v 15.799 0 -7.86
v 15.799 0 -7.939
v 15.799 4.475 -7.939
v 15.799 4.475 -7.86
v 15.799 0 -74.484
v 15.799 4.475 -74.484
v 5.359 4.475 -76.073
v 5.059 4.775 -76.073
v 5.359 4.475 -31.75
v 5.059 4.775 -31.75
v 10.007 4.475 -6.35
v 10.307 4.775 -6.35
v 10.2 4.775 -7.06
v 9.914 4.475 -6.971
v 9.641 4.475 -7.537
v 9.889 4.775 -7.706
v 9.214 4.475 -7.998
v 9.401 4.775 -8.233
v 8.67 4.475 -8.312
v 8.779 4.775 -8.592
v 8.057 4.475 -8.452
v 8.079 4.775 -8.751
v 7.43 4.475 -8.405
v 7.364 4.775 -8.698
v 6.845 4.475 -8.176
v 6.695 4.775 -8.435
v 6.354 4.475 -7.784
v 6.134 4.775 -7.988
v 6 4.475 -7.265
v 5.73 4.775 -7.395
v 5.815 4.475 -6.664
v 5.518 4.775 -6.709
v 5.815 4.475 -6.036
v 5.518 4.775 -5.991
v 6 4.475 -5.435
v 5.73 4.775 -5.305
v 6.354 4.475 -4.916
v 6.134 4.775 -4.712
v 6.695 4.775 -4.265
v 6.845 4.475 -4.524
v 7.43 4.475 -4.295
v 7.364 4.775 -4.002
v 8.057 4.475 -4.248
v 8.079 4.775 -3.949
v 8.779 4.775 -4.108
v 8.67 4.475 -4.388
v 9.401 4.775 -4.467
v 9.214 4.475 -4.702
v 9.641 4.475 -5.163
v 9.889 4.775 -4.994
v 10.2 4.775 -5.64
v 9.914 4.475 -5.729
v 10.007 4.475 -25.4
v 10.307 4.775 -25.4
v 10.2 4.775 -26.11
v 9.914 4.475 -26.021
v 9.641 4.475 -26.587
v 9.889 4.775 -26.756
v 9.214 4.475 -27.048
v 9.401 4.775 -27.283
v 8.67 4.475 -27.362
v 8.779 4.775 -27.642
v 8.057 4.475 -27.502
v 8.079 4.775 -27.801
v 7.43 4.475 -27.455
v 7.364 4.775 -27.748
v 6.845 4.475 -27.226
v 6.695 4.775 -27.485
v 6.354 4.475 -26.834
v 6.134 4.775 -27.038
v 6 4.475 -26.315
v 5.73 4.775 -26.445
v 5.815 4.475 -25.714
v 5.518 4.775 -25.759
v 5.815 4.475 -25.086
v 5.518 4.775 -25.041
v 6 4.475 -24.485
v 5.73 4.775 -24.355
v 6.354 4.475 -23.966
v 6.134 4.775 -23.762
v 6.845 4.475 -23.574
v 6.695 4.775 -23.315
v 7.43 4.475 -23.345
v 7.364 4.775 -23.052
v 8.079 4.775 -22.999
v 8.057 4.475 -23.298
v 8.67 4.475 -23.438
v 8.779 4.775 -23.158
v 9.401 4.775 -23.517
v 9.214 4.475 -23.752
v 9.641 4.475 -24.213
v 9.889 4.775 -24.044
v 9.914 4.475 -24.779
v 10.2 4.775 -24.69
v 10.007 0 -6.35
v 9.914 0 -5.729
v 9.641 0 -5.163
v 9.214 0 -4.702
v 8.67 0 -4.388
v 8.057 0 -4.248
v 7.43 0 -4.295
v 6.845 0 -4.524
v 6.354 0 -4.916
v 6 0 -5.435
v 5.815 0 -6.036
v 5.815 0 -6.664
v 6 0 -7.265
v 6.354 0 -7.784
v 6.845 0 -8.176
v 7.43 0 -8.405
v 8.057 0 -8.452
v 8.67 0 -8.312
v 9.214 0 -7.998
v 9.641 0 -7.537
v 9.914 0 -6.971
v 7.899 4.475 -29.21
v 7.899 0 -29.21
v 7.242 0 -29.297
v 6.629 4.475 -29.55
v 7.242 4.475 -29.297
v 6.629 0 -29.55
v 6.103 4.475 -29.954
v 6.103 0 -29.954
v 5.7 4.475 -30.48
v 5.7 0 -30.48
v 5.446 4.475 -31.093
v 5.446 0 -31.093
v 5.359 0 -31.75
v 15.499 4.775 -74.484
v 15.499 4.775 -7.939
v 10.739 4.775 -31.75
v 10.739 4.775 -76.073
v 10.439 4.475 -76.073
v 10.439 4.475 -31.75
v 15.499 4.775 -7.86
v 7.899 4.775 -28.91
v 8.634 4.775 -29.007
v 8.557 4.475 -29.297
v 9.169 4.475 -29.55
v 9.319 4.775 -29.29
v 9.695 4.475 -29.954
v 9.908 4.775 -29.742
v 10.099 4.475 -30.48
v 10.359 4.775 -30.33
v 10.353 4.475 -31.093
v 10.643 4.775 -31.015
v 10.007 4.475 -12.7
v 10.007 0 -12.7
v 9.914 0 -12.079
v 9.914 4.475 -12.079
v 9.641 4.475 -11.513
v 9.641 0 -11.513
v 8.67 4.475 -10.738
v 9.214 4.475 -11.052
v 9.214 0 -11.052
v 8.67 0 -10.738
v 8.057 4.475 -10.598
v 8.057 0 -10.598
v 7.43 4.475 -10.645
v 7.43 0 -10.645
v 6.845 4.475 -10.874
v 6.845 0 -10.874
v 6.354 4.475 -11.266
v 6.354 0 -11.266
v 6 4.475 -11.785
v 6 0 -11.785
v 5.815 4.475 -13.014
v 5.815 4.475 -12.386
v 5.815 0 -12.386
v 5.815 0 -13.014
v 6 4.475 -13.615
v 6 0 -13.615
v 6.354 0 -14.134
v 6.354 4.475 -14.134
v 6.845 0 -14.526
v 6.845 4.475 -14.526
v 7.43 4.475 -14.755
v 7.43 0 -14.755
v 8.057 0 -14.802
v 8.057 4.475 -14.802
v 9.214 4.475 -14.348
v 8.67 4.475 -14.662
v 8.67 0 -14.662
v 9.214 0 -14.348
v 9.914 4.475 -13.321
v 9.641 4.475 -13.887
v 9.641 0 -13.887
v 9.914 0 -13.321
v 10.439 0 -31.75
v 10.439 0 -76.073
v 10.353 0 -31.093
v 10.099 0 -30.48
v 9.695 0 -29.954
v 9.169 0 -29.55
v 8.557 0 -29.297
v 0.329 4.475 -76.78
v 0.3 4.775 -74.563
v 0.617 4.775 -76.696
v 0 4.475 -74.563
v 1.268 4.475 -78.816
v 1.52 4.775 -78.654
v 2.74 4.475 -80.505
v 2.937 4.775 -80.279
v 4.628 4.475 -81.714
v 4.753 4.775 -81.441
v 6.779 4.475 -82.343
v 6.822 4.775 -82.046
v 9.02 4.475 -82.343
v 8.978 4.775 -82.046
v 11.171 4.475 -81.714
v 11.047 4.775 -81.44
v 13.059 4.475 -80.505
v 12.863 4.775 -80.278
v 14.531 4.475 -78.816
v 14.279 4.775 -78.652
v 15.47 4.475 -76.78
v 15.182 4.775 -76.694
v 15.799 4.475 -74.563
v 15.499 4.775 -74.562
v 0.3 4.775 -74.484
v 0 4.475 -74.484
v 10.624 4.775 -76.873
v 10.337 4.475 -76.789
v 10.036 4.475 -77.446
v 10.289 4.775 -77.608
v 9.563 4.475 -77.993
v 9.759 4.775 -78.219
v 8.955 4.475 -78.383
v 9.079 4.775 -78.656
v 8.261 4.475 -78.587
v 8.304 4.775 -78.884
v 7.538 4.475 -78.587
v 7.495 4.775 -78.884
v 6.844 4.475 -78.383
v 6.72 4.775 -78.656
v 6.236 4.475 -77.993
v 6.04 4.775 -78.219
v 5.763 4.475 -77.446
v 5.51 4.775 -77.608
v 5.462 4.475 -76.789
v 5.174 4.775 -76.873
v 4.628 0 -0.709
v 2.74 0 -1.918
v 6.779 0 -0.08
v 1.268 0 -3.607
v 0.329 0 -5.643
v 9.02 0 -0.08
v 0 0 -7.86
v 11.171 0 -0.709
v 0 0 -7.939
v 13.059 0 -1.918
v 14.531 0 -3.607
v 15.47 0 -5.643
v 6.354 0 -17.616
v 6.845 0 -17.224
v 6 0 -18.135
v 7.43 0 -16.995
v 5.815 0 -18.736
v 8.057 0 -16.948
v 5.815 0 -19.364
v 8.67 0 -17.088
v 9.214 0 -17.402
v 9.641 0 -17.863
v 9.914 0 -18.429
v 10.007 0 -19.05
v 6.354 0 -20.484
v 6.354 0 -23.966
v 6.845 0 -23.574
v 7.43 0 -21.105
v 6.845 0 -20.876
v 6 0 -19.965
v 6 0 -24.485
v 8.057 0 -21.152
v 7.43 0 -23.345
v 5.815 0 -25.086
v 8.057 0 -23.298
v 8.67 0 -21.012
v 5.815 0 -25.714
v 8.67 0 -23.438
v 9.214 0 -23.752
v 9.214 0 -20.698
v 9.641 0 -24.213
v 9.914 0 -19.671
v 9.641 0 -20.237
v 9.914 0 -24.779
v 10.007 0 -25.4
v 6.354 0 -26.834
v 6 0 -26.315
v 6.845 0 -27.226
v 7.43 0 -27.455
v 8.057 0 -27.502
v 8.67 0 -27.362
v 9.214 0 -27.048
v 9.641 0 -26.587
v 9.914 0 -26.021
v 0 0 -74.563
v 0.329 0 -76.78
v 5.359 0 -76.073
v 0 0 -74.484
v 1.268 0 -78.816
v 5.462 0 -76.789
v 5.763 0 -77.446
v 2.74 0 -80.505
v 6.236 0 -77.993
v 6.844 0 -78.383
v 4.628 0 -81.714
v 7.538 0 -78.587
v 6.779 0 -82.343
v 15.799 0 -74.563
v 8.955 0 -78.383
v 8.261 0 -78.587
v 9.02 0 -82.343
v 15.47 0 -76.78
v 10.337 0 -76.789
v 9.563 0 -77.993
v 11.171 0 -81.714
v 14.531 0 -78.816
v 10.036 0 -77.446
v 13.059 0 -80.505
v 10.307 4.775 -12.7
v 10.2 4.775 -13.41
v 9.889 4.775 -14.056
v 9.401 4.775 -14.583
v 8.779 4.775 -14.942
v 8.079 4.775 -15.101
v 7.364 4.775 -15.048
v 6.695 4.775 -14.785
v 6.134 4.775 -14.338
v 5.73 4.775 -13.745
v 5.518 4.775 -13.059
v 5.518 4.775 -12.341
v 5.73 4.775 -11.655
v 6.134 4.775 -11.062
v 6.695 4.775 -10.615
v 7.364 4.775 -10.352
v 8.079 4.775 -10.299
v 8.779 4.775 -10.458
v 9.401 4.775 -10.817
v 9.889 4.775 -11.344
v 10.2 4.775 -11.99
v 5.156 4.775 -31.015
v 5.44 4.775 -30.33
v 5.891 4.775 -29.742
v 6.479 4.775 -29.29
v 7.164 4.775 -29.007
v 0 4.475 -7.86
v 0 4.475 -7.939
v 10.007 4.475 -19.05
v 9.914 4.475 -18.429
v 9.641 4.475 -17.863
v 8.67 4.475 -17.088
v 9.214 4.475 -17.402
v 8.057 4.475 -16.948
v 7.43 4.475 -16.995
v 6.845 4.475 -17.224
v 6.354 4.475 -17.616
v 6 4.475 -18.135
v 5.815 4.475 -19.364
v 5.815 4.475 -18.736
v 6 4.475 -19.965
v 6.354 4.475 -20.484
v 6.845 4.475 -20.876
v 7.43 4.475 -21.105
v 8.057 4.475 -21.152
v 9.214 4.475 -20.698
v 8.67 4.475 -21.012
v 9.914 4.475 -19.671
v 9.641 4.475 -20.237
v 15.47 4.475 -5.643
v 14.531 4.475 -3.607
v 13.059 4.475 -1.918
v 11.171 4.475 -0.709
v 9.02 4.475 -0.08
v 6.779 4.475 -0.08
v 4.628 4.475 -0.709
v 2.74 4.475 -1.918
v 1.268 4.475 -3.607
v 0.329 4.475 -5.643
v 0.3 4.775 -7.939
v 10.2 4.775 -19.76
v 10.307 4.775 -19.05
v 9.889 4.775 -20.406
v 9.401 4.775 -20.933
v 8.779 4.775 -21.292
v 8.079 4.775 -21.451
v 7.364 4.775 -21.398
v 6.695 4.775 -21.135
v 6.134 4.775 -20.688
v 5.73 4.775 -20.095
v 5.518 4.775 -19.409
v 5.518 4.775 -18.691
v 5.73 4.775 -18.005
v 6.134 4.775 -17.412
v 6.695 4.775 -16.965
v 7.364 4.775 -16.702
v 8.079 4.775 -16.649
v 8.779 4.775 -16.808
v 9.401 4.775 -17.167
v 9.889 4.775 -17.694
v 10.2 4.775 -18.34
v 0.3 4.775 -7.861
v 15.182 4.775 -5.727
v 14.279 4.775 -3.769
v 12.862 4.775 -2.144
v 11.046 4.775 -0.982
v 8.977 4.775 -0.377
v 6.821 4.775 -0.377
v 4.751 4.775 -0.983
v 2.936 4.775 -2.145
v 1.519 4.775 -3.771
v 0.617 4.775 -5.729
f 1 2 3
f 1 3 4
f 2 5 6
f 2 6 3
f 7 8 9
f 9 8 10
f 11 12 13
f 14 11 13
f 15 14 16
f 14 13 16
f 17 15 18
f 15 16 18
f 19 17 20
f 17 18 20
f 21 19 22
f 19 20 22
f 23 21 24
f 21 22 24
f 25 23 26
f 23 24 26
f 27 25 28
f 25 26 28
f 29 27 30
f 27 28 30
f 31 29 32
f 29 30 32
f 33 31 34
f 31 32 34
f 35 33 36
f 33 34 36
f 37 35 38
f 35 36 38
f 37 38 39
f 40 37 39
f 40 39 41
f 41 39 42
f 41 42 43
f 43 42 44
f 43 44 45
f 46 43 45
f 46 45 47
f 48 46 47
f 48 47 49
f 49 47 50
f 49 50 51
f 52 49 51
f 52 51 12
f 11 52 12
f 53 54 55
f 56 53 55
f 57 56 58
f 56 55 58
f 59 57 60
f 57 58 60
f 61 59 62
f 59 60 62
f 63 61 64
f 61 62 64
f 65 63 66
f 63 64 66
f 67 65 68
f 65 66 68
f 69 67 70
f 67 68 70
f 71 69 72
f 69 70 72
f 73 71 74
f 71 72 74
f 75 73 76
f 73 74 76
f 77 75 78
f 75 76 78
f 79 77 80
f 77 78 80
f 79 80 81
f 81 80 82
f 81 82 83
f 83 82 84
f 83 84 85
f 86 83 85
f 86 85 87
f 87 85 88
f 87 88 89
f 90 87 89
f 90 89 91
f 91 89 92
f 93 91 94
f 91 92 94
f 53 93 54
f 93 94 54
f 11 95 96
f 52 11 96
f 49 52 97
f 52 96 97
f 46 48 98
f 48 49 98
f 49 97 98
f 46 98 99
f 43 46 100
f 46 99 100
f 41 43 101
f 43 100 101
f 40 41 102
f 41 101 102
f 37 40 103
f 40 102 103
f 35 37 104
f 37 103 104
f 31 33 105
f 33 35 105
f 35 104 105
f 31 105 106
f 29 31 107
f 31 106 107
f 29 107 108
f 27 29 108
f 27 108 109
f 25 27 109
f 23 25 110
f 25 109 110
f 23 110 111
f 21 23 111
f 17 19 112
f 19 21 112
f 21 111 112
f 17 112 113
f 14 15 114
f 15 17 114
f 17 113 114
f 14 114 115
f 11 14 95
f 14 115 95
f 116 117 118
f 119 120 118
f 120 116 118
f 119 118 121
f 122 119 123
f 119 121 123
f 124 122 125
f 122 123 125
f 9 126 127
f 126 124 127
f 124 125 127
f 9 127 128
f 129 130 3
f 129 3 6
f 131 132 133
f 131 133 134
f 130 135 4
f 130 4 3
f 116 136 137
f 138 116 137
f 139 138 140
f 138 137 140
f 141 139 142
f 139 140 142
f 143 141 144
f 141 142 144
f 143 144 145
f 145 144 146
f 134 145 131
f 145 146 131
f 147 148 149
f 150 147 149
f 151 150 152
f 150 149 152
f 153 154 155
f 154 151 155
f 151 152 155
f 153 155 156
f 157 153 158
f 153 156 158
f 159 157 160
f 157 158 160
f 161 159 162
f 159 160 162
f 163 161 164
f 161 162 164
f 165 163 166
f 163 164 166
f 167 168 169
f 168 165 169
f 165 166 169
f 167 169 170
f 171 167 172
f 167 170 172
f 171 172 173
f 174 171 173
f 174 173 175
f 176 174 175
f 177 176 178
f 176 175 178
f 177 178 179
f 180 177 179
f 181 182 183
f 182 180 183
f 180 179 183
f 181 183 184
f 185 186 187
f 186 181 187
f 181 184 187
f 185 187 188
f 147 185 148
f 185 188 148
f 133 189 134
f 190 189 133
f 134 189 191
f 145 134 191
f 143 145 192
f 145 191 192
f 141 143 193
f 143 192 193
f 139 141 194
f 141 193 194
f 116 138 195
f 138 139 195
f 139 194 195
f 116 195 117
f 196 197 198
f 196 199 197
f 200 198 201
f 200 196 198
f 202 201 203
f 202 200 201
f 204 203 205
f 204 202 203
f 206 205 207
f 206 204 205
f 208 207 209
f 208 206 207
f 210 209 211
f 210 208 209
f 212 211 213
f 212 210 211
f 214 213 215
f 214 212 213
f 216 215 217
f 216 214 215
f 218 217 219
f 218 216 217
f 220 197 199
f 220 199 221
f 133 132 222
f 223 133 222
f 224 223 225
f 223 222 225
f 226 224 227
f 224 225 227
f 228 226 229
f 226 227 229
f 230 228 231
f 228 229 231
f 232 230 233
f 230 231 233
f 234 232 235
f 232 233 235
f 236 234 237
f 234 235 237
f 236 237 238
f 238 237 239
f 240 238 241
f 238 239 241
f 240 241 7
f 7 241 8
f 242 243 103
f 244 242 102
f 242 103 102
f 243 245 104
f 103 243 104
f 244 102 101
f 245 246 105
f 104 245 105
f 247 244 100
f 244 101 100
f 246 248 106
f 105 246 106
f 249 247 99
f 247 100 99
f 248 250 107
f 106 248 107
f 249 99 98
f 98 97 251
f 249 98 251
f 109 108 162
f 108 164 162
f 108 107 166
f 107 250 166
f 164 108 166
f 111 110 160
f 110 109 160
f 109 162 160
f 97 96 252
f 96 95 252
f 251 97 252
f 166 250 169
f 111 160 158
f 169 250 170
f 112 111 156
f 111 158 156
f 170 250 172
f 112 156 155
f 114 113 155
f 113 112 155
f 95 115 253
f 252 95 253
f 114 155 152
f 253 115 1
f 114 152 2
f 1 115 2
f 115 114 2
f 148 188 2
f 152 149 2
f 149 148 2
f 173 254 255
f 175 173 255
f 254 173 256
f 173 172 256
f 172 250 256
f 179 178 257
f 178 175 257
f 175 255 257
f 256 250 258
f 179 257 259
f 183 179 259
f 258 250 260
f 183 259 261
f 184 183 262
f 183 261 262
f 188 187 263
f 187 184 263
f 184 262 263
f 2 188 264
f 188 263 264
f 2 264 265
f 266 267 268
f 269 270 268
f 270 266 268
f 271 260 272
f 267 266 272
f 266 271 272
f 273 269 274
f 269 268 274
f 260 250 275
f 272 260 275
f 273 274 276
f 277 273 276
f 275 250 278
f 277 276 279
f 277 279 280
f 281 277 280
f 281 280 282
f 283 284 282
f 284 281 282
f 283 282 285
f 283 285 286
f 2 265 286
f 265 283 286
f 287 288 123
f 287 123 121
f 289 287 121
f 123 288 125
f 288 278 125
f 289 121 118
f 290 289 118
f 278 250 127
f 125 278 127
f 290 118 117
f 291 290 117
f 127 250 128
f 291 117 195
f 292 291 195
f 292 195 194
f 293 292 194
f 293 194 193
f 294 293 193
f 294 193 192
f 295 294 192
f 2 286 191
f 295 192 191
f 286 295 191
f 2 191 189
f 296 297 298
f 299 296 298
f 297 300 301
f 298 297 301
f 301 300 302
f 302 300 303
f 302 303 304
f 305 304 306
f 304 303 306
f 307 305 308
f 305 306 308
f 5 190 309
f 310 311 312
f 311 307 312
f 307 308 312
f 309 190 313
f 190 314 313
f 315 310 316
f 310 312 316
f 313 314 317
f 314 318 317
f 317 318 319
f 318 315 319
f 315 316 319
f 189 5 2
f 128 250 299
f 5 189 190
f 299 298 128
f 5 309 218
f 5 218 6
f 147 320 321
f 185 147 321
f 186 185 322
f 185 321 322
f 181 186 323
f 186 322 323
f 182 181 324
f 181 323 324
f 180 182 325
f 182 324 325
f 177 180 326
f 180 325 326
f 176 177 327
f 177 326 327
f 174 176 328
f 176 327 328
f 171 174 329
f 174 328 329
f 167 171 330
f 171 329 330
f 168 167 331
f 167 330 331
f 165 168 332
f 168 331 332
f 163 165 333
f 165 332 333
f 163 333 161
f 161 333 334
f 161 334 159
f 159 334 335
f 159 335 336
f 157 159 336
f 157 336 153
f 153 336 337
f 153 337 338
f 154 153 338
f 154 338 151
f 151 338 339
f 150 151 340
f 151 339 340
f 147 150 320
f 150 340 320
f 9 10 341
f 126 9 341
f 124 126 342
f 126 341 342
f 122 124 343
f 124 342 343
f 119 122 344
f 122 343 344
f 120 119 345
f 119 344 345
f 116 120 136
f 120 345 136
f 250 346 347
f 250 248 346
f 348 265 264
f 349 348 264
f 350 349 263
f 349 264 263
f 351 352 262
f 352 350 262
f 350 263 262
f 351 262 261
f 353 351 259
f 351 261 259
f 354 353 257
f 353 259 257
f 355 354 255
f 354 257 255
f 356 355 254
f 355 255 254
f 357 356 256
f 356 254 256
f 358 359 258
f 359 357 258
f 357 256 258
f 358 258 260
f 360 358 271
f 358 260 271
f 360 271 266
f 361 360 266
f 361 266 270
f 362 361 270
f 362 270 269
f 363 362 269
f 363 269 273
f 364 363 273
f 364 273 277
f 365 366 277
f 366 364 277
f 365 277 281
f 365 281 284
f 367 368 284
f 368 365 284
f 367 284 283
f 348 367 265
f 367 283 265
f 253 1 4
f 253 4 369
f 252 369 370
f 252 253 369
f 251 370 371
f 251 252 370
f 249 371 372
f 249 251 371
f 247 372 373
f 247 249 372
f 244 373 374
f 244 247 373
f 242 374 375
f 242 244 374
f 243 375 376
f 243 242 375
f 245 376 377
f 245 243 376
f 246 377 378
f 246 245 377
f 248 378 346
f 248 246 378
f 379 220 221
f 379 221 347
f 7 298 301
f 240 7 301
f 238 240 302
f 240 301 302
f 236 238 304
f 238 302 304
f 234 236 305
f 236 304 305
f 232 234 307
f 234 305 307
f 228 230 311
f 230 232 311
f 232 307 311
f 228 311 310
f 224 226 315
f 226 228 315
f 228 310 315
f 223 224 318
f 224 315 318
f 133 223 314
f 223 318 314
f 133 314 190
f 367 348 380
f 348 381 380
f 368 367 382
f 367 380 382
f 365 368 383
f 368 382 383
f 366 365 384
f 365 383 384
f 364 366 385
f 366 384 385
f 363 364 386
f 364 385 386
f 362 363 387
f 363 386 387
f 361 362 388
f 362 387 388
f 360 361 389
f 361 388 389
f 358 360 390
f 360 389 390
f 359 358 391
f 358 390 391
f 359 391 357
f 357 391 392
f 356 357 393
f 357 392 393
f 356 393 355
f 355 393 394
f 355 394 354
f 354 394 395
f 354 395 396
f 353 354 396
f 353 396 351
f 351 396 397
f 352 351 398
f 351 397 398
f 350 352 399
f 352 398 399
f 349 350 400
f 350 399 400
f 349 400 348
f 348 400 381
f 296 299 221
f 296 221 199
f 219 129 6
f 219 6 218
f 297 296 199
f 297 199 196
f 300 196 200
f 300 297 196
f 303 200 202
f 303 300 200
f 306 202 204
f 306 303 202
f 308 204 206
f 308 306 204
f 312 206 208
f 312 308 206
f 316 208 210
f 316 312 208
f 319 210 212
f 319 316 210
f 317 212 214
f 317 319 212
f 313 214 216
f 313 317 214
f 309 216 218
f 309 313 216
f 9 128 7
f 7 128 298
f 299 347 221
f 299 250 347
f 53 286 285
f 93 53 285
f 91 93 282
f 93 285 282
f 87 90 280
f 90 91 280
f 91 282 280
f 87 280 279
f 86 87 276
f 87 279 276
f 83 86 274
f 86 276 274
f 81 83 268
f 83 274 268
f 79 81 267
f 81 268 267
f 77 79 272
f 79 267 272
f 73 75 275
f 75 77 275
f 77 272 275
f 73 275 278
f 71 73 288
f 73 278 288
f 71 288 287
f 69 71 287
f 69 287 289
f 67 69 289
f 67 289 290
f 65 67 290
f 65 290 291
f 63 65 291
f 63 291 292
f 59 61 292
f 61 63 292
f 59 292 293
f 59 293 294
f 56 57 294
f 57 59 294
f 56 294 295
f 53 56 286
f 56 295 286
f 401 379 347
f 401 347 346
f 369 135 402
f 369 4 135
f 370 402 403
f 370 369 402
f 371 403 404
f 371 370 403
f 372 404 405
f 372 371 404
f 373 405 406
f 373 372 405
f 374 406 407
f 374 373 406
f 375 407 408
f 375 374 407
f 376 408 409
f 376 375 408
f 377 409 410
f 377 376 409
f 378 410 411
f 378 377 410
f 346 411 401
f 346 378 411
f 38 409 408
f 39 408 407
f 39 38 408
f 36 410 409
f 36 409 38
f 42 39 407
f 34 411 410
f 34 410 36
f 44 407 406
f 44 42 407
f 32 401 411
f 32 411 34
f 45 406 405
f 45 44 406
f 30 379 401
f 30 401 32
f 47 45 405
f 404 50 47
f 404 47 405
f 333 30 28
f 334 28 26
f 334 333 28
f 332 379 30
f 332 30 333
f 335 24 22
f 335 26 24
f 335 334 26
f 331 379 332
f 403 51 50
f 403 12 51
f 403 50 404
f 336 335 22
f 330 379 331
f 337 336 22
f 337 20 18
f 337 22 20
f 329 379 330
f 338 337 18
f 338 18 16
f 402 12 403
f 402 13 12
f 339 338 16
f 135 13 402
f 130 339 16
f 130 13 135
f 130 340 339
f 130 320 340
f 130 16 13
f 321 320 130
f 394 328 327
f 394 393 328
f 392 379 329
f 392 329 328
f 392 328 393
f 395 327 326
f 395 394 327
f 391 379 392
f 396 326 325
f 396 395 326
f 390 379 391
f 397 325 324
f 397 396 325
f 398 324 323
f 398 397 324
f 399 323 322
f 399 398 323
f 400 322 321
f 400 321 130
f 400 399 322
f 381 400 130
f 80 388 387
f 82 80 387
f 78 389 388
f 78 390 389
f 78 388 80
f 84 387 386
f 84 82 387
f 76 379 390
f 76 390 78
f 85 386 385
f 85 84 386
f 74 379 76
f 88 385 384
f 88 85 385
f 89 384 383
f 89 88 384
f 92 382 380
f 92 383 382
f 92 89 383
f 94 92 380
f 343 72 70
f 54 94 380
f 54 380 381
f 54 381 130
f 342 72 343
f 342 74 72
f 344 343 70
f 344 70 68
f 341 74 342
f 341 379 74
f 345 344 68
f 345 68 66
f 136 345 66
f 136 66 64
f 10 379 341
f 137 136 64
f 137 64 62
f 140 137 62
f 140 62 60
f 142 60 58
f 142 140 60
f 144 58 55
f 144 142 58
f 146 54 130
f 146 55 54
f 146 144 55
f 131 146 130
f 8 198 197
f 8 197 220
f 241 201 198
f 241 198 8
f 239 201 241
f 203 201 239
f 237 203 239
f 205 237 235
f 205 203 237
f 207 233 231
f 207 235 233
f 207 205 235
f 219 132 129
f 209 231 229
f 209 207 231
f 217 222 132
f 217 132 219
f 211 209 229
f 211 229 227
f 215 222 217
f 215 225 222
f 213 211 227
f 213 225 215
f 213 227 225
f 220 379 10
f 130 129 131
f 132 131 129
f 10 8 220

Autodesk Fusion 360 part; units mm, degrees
sketch "Esboço1" plane through (0, 0, 0) normal (0, 1, 0) x (1, 0, 0)
  line L0 (15.7988, 74.5632) -> (15.7988, 7.8598)
  line L1 (0, 7.8598) -> (0, 74.5632)
  circle A0 centre (7.8994, 6.35) radius 2.108
  circle A1 centre (7.8994, 12.7) radius 2.108
  circle A2 centre (7.8994, 19.05) radius 2.108
  circle A3 centre (7.8994, 25.4) radius 2.108
  line L2 (7.8994, 29.21) -> (7.8994, 31.75)
  arc A4 (15.7988, 74.4838) -> (0, 74.4838) centre (7.8994, 74.5235) ccw
  arc A5 (0, 7.9392) -> (15.7988, 7.9392) centre (7.8994, 7.8995) ccw
  arc A6 (5.3594, 31.75) -> (10.4394, 31.75) centre (7.8994, 31.75) ccw
  arc A7 (10.4394, 76.073) -> (5.3594, 76.073) centre (7.8994, 76.073) ccw
  line L3 (5.3594, 31.75) -> (5.3594, 76.073)
  line L4 (10.4394, 31.75) -> (10.4394, 76.073)
  dimension "d4" = 6.35
  dimension "d5" = 6.35
  dimension "d6" = 6.35
  dimension "d8" = 5.08
  dimension "d11" = 4.216
  dimension "d12" = 4.216
  dimension "d13" = 4.216
  dimension "d14" = 4.216
  dimension "d15" = 6.35
  dimension "d16" = 5.08
extrude "Extrusão1" add sketch "Esboço1" along normal blind 4.7752
chamfer "Chanfro1" distance 0.3 angle 45 12 edges at (15.7988, 4.7752, -41.2115) (7.8994, 4.7752, 0) (0, 4.7752, -41.2115) (7.8994, 4.7752, -82.423) (10.4394, 4.7752, -53.9115) (7.8994, 4.7752, -29.21) (5.3594, 4.7752, -53.9115) (7.8994, 4.7752, -78.613) (5.9341, 4.7752, -26.1623) (5.9341, 4.7752, -19.8123) (5.9341, 4.7752, -13.4623) (5.9341, 4.7752, -7.1123)
